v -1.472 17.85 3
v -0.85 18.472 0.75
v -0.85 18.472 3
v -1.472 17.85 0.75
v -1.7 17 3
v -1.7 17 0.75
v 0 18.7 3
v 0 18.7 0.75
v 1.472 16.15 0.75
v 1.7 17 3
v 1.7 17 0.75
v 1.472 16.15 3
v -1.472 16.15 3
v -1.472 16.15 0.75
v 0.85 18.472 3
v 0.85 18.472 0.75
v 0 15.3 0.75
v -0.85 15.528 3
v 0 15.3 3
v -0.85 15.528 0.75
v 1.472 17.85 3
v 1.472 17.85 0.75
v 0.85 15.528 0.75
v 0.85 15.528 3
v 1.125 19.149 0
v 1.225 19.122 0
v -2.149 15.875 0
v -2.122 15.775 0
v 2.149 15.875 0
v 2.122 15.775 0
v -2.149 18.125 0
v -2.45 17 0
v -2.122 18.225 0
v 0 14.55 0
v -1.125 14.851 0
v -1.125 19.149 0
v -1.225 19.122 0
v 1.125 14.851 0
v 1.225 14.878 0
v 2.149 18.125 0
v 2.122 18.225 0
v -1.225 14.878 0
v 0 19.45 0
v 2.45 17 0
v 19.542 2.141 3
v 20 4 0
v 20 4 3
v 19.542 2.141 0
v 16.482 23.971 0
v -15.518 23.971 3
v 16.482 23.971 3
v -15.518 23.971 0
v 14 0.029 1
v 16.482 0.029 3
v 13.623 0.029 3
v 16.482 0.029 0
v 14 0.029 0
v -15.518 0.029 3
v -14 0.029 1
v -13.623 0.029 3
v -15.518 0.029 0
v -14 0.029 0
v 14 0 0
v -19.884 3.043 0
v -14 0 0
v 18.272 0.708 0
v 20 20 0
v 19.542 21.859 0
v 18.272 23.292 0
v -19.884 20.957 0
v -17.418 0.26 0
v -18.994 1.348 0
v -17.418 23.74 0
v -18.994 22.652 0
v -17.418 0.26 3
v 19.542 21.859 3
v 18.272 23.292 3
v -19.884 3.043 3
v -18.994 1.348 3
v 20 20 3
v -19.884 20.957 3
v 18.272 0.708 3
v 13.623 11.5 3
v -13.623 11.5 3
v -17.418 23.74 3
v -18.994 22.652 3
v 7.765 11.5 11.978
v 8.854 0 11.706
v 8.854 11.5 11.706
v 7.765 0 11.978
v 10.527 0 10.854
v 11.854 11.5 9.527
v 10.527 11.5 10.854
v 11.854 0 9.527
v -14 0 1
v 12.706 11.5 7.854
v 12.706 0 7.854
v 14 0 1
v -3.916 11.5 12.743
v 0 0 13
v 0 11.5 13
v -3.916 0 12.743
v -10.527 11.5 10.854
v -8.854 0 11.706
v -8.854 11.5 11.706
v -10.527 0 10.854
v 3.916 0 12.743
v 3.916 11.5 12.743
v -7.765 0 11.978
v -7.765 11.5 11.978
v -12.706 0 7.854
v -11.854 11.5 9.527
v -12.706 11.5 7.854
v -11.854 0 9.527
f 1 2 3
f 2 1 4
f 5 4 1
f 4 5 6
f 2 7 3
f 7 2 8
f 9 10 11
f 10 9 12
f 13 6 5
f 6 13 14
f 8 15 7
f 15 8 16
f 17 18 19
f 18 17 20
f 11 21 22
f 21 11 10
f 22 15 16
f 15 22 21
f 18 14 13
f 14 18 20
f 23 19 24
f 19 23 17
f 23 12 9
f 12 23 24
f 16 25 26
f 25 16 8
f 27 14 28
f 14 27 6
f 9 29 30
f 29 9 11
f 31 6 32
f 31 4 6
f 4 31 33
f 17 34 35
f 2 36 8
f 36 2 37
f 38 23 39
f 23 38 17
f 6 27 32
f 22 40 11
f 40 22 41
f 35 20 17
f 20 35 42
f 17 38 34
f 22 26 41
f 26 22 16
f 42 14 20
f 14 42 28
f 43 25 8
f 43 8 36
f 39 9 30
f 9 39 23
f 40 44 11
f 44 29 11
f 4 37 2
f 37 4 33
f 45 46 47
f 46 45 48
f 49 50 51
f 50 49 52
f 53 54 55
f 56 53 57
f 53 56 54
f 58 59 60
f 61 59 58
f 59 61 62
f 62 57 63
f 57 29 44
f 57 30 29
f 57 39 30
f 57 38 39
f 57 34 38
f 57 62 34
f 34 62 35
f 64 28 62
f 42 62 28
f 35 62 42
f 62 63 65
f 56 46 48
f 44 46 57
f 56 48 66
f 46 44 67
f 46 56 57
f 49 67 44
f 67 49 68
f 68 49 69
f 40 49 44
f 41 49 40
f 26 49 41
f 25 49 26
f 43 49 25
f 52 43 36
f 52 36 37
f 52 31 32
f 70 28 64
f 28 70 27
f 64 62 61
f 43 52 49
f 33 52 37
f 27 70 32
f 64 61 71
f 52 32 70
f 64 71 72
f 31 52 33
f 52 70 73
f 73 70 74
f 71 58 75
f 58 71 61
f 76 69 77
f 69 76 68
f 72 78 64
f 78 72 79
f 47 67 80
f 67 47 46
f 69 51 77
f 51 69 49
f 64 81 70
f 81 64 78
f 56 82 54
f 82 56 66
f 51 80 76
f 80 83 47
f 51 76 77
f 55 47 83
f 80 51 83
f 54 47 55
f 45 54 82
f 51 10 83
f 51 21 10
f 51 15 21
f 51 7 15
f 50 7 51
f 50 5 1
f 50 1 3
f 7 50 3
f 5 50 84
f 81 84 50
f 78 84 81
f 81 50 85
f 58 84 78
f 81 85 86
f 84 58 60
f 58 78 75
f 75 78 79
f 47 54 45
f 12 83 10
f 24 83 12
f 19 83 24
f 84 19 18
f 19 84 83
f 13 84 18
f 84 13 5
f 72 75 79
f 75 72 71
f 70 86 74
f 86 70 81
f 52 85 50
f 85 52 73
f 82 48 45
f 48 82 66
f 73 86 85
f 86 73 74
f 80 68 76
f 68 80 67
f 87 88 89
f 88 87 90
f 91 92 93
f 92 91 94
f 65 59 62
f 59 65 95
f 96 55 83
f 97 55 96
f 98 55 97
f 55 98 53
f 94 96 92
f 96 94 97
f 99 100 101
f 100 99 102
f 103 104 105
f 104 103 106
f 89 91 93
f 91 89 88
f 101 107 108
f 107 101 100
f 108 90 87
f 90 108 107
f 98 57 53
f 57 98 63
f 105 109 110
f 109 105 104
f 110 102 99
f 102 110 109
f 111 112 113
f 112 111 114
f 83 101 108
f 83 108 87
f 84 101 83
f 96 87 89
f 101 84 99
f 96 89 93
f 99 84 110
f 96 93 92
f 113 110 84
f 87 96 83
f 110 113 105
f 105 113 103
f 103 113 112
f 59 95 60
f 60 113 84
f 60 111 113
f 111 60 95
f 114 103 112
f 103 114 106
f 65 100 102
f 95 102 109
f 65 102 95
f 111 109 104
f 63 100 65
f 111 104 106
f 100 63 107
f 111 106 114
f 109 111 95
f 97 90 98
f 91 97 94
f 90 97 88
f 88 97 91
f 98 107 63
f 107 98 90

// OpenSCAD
// A foot for a panini press
// The original made from a soft plastic, like a stabilized silicone.
// We roll the ABS just to make the appliance even on the countertop.

base_w = 40;
base_d = 24;
base_h = 3.0;
base_r = 4.0;

roof_d = 11.5;
roof_big_r = 30.0;
roof_big_w = 17.0;
roof_small_r = 6.0;

// Cone is 50% wider than the hole
module hole(dia, height) {
    union () {
        cylinder(height, dia/2, dia/2, $fn=12);
        translate ([0,0, height-(dia/4)]) {
            cylinder(dia/4, dia/2, (dia*1.5)/2, $fn=12);
        }
    }
}

module base () {
    hull () {
        translate([(base_w/2 - base_r)*-1, base_r, 0])
            cylinder(base_h, base_r, base_r);
        translate([(base_w/2 - base_r), base_r, 0])
            cylinder(base_h, base_r, base_r);
        translate([(base_w/2 - base_r)*-1, (base_d-base_r), 0])
            cylinder(base_h, base_r, base_r);
        translate([(base_w/2 - base_r), (base_d-base_r), 0])
            cylinder(base_h, base_r, base_r);
    }
}

module roof () {
    // Large radius segment for the top

    // A segment of thickness 7.0, sitting at the zero plane.
    // But we have to truncate it in the X direction as well.
    intersection () {
        translate([-roof_big_w/2, 0, 0])
            cube([roof_big_w, roof_d, 7.0]);
        translate([0, 0, (roof_big_r - 7.0)*-1])
            rotate(-90, [1,0,0])
                cylinder(roof_d, roof_big_r, roof_big_r, $fn=48);
    }


}

// Base with a hole in it
difference () {
    base();
    translate([0, 17.0, base_h+0.1])
        rotate(180, [0,1,0])
            hole(3.4, base_h + 0.2);
}

hull () {
    translate([0, 0, 6.0])
        roof();
    translate([7.0, 0, 6.0])
        rotate(-90, [1,0,0])
            cylinder(roof_d, roof_small_r, roof_small_r, $fn=20);
    translate([-7.0, 0, 6.0])
        rotate(-90, [1,0,0])
            cylinder(roof_d, roof_small_r, roof_small_r, $fn=20);
    translate([-28.0/2, 0, -0.0])
        cube([28.0, roof_d, 1.0]);
}
